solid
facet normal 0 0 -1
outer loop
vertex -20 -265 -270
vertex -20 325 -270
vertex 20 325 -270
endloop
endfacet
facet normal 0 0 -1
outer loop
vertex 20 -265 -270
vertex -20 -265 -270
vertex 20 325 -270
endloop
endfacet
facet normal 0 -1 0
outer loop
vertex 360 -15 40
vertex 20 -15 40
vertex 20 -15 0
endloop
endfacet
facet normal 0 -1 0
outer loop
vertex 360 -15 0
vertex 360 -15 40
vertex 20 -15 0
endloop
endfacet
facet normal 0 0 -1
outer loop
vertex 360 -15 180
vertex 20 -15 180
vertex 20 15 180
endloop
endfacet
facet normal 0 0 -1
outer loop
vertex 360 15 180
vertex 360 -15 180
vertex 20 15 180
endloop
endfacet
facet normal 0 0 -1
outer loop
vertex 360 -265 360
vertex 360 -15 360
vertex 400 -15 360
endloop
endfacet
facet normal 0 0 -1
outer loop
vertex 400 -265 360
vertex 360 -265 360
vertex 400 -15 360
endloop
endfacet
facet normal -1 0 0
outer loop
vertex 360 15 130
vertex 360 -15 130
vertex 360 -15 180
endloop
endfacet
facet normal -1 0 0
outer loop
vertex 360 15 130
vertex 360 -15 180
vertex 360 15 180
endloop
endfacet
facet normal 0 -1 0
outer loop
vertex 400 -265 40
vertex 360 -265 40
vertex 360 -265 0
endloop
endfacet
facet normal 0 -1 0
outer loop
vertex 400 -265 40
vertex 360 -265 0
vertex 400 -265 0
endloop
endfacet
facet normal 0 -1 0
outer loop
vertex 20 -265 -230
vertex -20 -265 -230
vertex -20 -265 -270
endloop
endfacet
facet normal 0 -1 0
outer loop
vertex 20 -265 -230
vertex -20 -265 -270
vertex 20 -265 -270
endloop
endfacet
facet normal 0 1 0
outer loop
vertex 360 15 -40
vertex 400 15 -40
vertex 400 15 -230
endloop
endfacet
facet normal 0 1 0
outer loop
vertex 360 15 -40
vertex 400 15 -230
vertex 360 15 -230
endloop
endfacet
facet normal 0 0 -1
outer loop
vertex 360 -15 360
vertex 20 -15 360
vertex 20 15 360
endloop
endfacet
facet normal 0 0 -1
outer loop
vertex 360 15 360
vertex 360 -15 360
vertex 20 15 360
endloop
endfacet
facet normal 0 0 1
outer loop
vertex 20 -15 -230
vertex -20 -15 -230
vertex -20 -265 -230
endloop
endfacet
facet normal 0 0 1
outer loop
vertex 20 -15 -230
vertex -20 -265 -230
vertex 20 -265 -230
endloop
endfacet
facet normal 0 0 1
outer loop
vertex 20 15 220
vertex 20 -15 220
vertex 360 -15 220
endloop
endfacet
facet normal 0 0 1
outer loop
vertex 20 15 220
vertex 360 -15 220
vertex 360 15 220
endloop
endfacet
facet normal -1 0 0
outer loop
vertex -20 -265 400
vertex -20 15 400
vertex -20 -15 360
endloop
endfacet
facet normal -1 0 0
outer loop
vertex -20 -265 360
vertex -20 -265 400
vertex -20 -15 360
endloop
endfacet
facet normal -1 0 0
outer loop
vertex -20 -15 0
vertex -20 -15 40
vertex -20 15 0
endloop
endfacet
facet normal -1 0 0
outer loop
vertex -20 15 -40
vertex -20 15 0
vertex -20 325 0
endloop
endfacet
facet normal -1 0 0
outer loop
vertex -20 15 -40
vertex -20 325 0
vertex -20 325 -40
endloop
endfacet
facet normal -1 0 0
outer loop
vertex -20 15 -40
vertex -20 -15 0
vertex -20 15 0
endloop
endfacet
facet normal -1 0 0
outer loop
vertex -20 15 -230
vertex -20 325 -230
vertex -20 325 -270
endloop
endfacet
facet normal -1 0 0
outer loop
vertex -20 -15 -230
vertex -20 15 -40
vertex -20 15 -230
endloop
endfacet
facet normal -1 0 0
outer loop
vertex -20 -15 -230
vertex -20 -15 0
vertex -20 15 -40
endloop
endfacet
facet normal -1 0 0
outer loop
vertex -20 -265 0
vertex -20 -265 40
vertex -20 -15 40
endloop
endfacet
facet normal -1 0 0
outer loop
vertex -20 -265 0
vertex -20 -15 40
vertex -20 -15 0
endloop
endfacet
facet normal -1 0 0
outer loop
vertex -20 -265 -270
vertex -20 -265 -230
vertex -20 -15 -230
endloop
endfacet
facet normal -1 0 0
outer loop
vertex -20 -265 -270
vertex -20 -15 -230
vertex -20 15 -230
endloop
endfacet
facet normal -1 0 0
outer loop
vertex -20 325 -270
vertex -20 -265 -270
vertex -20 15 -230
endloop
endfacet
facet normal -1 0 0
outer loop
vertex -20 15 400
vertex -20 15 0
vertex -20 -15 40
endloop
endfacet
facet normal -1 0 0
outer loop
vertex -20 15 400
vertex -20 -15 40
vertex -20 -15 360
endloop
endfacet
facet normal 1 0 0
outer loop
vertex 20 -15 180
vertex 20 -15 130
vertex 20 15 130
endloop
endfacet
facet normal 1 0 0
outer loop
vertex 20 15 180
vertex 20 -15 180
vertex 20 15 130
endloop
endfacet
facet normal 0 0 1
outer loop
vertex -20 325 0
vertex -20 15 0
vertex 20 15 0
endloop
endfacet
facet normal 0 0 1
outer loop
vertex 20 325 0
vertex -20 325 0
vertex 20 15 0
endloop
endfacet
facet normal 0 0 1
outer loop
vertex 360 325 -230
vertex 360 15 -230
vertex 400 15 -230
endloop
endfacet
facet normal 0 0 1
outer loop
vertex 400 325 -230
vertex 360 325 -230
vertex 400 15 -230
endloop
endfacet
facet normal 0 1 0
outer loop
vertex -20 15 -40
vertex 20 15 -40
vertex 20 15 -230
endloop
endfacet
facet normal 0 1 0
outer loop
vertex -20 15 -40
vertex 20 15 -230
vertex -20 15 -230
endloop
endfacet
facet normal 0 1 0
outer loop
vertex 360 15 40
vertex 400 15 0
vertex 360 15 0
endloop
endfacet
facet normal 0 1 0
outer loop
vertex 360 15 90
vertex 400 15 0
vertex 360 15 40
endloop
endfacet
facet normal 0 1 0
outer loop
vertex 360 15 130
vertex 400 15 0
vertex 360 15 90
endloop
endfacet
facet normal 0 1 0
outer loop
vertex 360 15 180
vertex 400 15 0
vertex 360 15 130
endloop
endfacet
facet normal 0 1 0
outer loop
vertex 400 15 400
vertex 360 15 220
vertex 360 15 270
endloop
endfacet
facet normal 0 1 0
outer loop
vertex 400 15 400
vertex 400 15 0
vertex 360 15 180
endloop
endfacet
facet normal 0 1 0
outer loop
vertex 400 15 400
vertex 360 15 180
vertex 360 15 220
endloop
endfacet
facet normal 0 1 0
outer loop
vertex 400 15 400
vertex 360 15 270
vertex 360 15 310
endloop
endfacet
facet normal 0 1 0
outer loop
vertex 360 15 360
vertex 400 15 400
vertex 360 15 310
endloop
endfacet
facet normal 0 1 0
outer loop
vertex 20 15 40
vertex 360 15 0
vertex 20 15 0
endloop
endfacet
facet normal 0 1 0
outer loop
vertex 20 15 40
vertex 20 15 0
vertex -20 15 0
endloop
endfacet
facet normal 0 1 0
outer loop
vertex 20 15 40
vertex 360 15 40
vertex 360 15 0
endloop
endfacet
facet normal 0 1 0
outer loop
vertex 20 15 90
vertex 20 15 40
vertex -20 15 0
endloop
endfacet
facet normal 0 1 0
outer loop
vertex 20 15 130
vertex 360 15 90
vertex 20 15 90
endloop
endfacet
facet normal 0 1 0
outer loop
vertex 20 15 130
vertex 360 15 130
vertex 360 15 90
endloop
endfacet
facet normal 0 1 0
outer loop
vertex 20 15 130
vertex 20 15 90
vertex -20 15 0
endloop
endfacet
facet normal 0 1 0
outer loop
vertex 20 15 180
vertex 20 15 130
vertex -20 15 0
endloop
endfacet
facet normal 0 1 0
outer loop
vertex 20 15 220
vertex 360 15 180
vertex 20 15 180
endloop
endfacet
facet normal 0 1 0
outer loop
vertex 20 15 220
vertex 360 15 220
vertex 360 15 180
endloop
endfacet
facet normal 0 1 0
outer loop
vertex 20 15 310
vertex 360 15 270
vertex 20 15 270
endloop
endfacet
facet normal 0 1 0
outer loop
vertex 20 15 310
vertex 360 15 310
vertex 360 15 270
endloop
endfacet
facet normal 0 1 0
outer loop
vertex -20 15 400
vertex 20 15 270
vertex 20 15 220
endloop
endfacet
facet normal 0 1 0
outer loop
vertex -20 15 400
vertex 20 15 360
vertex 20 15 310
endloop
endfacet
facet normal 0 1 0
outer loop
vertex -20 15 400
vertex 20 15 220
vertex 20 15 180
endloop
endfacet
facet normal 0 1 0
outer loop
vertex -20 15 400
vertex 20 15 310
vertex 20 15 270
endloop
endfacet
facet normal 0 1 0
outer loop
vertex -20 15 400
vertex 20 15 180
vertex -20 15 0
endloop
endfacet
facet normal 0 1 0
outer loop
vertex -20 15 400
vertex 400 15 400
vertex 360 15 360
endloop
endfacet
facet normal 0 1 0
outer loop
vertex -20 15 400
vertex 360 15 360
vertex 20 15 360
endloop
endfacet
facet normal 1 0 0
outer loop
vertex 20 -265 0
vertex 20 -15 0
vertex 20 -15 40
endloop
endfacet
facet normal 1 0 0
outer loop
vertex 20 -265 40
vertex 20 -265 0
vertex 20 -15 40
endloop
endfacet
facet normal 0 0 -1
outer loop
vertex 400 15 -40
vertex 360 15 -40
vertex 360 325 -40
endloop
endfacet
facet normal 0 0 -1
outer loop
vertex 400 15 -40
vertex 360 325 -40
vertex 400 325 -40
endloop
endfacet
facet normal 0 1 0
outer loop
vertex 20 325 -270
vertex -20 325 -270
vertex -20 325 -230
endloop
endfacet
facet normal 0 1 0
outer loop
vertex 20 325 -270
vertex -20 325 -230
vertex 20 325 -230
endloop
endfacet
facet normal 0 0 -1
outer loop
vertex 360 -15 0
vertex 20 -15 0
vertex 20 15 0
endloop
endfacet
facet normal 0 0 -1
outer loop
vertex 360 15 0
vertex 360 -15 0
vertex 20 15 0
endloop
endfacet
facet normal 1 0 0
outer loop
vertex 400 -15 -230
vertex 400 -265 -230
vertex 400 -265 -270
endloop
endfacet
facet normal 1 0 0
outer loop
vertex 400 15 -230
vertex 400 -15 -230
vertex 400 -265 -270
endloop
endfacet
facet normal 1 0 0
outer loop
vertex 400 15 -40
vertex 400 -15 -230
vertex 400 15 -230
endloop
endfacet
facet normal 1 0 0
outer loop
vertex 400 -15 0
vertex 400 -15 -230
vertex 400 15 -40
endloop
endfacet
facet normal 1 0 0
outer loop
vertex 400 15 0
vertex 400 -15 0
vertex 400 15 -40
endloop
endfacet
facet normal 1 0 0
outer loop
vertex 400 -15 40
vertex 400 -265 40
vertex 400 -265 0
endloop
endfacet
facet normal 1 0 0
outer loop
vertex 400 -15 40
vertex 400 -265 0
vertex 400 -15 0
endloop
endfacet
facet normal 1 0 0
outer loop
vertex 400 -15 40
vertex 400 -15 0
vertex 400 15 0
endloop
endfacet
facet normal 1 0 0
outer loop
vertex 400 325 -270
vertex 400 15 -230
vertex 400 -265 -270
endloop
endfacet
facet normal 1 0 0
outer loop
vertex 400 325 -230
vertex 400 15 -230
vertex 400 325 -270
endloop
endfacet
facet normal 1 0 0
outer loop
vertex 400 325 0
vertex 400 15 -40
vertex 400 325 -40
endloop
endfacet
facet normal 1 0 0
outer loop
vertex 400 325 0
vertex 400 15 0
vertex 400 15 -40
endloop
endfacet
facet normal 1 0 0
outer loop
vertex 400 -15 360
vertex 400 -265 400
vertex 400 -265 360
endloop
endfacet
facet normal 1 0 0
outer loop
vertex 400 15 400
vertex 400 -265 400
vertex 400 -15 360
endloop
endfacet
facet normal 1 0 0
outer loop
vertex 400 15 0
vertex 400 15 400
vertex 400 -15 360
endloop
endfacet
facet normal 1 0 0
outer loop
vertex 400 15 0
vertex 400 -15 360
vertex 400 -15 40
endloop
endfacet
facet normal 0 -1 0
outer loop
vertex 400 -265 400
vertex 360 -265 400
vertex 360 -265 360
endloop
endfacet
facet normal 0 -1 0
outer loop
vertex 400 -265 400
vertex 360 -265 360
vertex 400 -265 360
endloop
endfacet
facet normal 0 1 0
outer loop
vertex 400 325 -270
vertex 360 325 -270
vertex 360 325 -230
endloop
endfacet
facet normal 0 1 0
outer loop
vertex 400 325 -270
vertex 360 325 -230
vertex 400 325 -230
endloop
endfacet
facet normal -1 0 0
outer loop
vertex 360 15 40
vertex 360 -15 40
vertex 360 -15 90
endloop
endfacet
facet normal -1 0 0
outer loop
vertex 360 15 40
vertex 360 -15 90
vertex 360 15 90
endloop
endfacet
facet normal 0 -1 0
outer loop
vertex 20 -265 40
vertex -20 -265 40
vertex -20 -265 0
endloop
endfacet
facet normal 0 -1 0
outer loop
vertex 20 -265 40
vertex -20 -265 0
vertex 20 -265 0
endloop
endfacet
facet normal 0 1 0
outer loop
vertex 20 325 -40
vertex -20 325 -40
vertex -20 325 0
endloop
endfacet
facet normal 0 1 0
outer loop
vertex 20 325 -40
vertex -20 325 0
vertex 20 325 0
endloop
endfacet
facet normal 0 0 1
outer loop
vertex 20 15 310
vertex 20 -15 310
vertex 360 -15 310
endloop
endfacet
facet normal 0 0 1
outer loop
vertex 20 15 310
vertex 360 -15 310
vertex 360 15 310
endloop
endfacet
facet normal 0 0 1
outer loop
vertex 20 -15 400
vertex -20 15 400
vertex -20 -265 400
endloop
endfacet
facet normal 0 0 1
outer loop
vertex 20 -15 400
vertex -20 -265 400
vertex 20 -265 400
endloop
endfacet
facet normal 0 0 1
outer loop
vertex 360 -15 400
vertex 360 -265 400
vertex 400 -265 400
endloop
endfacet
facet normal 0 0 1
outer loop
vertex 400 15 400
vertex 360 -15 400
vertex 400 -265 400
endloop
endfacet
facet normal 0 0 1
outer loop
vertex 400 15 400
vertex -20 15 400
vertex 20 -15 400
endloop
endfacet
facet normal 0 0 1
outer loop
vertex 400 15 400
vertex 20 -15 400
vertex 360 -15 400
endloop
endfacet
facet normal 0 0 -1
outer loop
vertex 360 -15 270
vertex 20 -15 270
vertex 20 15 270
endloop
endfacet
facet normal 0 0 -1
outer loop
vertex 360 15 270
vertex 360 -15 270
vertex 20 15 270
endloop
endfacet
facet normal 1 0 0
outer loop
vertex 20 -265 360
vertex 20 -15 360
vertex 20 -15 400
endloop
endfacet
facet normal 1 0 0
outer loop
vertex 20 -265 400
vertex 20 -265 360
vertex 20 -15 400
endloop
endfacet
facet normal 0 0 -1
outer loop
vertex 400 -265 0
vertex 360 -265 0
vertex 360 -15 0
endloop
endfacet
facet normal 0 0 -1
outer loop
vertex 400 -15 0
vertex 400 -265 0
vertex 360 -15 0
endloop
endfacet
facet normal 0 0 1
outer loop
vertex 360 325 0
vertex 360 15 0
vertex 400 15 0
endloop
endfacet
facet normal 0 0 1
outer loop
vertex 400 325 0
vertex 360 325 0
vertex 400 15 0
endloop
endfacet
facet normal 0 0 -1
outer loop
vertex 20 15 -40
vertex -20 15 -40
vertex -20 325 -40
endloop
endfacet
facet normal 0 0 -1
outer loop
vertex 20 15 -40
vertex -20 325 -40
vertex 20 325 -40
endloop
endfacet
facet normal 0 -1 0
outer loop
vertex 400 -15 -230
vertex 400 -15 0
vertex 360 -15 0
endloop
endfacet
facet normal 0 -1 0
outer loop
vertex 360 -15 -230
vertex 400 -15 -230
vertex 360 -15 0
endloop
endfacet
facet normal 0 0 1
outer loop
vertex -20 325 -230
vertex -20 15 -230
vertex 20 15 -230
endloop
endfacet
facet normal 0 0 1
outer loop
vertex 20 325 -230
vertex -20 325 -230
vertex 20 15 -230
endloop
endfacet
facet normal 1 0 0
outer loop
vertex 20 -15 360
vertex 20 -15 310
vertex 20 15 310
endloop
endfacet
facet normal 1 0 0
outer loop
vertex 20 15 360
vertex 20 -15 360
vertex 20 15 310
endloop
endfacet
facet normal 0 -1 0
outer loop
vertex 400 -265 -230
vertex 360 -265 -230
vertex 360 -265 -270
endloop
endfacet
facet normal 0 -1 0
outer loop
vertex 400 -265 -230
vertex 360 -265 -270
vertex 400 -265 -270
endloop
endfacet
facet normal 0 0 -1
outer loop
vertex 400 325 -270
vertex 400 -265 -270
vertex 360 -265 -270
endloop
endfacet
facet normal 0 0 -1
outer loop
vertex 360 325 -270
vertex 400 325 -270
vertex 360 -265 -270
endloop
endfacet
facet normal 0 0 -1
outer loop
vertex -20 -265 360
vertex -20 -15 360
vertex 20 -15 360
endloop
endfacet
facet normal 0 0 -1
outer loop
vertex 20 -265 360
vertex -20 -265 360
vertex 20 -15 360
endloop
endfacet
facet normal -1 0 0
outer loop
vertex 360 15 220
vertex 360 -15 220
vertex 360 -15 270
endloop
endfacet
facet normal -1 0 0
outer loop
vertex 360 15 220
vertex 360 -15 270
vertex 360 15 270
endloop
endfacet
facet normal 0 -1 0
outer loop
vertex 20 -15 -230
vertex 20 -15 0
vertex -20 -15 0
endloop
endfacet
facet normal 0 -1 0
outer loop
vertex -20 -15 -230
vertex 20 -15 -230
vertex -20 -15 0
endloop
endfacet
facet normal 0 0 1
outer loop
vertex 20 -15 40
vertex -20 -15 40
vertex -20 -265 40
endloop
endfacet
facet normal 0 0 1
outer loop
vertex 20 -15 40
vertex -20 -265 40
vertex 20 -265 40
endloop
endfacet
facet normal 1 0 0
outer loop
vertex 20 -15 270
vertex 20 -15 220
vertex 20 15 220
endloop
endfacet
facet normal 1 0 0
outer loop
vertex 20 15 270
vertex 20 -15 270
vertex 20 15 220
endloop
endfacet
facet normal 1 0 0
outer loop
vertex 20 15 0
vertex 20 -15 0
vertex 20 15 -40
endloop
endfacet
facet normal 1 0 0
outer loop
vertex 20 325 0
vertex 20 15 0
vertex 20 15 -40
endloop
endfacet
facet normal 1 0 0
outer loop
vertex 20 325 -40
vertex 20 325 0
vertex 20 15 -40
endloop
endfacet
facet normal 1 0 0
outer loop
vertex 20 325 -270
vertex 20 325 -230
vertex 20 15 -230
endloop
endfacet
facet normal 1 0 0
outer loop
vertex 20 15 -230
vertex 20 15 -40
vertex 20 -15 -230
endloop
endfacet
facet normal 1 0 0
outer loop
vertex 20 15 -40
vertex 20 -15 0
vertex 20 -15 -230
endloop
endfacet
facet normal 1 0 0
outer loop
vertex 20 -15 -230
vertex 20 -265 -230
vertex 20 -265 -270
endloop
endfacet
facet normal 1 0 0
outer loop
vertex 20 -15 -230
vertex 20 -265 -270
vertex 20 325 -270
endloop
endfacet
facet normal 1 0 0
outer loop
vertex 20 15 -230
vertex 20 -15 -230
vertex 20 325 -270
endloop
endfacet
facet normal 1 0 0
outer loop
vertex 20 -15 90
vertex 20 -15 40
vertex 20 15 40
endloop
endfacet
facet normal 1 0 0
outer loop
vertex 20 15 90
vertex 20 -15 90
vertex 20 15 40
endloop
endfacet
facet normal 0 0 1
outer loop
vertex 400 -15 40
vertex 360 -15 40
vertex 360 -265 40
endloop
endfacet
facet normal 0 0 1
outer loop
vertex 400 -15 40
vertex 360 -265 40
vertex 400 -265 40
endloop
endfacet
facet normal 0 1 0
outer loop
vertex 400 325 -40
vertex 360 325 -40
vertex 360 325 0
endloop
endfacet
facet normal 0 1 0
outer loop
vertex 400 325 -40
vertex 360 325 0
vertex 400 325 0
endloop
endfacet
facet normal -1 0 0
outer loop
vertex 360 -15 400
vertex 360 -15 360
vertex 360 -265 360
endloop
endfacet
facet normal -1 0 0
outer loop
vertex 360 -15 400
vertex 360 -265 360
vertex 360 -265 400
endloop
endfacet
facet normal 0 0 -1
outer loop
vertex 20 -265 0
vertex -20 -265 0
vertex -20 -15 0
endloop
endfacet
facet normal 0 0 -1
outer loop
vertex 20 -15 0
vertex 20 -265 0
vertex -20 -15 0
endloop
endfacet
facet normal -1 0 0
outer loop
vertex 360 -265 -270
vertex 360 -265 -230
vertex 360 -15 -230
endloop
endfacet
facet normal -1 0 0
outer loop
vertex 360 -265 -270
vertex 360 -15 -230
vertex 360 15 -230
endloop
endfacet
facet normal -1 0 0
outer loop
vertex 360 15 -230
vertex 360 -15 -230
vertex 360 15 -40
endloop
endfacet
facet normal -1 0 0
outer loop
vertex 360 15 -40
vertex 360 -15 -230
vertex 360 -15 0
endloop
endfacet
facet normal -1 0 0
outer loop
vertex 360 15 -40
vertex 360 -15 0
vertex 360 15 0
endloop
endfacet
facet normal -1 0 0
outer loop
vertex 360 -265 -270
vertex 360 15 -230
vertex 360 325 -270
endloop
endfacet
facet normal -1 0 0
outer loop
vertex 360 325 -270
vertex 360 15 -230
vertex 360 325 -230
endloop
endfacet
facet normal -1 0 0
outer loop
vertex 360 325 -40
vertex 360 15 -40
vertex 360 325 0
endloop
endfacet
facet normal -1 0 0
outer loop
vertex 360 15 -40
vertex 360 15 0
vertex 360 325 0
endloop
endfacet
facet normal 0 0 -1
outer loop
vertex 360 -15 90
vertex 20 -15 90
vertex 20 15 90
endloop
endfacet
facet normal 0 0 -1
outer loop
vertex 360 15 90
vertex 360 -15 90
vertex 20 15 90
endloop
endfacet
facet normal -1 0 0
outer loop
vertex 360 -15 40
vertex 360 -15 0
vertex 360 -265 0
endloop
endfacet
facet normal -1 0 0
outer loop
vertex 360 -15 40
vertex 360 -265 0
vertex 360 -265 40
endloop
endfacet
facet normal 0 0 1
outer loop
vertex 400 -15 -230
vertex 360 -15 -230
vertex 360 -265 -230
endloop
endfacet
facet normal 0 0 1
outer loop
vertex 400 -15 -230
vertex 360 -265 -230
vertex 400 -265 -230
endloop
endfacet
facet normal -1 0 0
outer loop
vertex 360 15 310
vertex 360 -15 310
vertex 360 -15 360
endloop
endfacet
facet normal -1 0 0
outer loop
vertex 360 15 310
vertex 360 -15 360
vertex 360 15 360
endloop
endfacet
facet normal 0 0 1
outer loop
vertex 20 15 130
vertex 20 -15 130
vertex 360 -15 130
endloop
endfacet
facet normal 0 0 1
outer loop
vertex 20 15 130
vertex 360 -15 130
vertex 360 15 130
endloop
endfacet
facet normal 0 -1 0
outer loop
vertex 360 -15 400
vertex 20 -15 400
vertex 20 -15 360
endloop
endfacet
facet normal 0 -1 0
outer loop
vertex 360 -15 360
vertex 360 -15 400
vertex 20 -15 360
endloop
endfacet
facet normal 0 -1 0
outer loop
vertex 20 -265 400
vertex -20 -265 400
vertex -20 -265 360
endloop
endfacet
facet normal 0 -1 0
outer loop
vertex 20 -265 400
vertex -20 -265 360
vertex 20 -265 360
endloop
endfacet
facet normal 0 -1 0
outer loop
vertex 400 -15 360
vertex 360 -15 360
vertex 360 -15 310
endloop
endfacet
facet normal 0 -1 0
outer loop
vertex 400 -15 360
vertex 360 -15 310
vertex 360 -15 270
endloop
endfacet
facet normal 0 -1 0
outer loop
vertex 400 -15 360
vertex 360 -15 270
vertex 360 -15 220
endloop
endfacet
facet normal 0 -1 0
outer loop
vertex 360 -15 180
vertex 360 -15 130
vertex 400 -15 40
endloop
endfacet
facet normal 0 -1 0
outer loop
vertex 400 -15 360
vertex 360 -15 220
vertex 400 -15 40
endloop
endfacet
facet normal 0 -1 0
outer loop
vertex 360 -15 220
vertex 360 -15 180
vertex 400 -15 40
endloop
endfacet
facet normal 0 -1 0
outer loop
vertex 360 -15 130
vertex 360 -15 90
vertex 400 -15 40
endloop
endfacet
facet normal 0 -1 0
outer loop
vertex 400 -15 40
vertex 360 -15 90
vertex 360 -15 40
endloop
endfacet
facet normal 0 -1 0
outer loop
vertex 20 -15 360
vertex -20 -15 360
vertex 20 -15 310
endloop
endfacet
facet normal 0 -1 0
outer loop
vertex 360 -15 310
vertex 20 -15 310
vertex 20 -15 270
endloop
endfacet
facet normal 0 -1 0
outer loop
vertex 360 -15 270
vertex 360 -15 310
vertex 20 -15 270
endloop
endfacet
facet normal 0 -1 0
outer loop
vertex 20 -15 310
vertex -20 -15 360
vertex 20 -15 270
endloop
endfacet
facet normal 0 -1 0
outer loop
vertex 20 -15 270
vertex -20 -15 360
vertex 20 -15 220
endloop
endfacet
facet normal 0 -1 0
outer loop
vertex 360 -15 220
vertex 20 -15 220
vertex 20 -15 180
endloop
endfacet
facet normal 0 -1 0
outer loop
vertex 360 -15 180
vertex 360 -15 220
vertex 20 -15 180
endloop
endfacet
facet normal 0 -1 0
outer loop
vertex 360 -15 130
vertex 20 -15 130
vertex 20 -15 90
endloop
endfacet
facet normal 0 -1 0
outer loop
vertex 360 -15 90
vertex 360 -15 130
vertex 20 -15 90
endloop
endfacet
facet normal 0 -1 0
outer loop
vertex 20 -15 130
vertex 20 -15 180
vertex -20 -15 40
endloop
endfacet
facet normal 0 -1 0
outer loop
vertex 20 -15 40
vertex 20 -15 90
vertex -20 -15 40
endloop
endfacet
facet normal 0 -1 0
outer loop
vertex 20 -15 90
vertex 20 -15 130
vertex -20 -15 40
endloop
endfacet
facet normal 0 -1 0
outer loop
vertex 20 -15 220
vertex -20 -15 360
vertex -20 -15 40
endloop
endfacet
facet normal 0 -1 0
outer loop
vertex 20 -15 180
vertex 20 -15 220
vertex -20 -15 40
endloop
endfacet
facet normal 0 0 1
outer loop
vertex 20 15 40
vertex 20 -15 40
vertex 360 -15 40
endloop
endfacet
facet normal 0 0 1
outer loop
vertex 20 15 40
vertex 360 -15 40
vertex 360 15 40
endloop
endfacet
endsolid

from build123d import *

# Parameters (mm, degrees)
SKETCH1_W             = 40
SKETCH1_H             = 30
BOSS_EXTRUDE1_DEPTH   = 400
BOSS_EXTRUDE1_2_DEPTH = 400
BOSS_EXTRUDE2_REACH   = 553.928
SKETCH2_W             = 40
SKETCH2_H             = 30
SKETCH3_W             = 40
SKETCH3_H             = 40
BOSS_EXTRUDE3_DEPTH   = 250
SKETCH4_W             = 40
SKETCH4_H             = 30
BOSS_EXTRUDE4_DEPTH   = 270
SKETCH5_W             = 40
SKETCH5_H             = 40
BOSS_EXTRUDE5_DEPTH   = 250
SKETCH6_W             = 40
SKETCH6_H             = 40
BOSS_EXTRUDE6_DEPTH   = 310


with BuildPart() as part:
    # Sketch1 → Boss-Extrude1 (new body)
    with BuildSketch(Plane.XY):
        Rectangle(SKETCH1_W, SKETCH1_H)
    extrude(amount=BOSS_EXTRUDE1_DEPTH)


with BuildPart() as body_2:
    # Sketch1 → Boss-Extrude1 2 (new body)
    with BuildSketch(Plane.XY):
        with Locations((380, 0)):
            Rectangle(SKETCH1_W, SKETCH1_H)
    extrude(amount=BOSS_EXTRUDE1_2_DEPTH)

    # Sketch2 → Boss-Extrude2 (add, up to next)
    with BuildSketch(Plane(origin=(20, 0, 0), x_dir=(0, 0, -1), z_dir=(1, 0, 0)), mode=Mode.PRIVATE) as boss_extrude2_sk1:
        with Locations((-380, 0)):
            Rectangle(SKETCH2_W, SKETCH2_H)
    boss_extrude2_tool1 = extrude(boss_extrude2_sk1.sketch, amount=BOSS_EXTRUDE2_REACH, mode=Mode.PRIVATE) - body_2.part
    # Sketch2 → Boss-Extrude2 (add, up to next)
    with BuildSketch(Plane(origin=(20, 0, 0), x_dir=(0, 0, -1), z_dir=(1, 0, 0)), mode=Mode.PRIVATE) as boss_extrude2_sk2:
        with Locations((-290, 0)):
            Rectangle(SKETCH2_W, SKETCH2_H)
    boss_extrude2_tool2 = extrude(boss_extrude2_sk2.sketch, amount=BOSS_EXTRUDE2_REACH, mode=Mode.PRIVATE) - body_2.part
    # Sketch2 → Boss-Extrude2 (add, up to next)
    with BuildSketch(Plane(origin=(20, 0, 0), x_dir=(0, 0, -1), z_dir=(1, 0, 0)), mode=Mode.PRIVATE) as boss_extrude2_sk3:
        with Locations((-110, 0)):
            Rectangle(SKETCH2_W, SKETCH2_H)
    boss_extrude2_tool3 = extrude(boss_extrude2_sk3.sketch, amount=BOSS_EXTRUDE2_REACH, mode=Mode.PRIVATE) - body_2.part
    # Sketch2 → Boss-Extrude2 (add, up to next)
    with BuildSketch(Plane(origin=(20, 0, 0), x_dir=(0, 0, -1), z_dir=(1, 0, 0)), mode=Mode.PRIVATE) as boss_extrude2_sk4:
        with Locations((-20, 0)):
            Rectangle(SKETCH2_W, SKETCH2_H)
    boss_extrude2_tool4 = extrude(boss_extrude2_sk4.sketch, amount=BOSS_EXTRUDE2_REACH, mode=Mode.PRIVATE) - body_2.part
    # Sketch2 → Boss-Extrude2 (add, up to next)
    with BuildSketch(Plane(origin=(20, 0, 0), x_dir=(0, 0, -1), z_dir=(1, 0, 0)), mode=Mode.PRIVATE) as boss_extrude2_sk5:
        with Locations((-200, 0)):
            Rectangle(SKETCH2_W, SKETCH2_H)
    boss_extrude2_tool5 = extrude(boss_extrude2_sk5.sketch, amount=BOSS_EXTRUDE2_REACH, mode=Mode.PRIVATE) - body_2.part

    add(part.part)  # Boss-Extrude2 merges part
    add(boss_extrude2_tool1.solids().sort_by_distance((20, 0, 380))[0])
    add(boss_extrude2_tool2.solids().sort_by_distance((20, 0, 290))[0])
    add(boss_extrude2_tool3.solids().sort_by_distance((20, 0, 110))[0])
    add(boss_extrude2_tool4.solids().sort_by_distance((20, 0, 20))[0])
    add(boss_extrude2_tool5.solids().sort_by_distance((20, 0, 200))[0])

    # Sketch3 → Boss-Extrude3 (add)
    with BuildSketch(Plane.XZ.offset(15)):
        with Locations((0, 380)):
            Rectangle(SKETCH3_W, SKETCH3_H)
        with Locations((0, 20)):
            Rectangle(SKETCH3_W, SKETCH3_H)
        with Locations((380, 380)):
            Rectangle(SKETCH3_W, SKETCH3_H)
        with Locations((380, 20)):
            Rectangle(SKETCH3_W, SKETCH3_H)
    extrude(amount=BOSS_EXTRUDE3_DEPTH)

    # Sketch4 → Boss-Extrude4 (add)
    with BuildSketch(Plane(origin=(0, 0, 0), x_dir=(-1, 0, 0), z_dir=(0, 0, -1))):
        with Locations((-380, 0)):
            Rectangle(SKETCH4_W, SKETCH4_H)
        Rectangle(SKETCH4_W, SKETCH4_H)
    extrude(amount=BOSS_EXTRUDE4_DEPTH)

    # Sketch5 → Boss-Extrude5 (add)
    with BuildSketch(Plane.XZ.offset(15)):
        with Locations((0, -250)):
            Rectangle(SKETCH5_W, SKETCH5_H)
        with Locations((380, -250)):
            Rectangle(SKETCH5_W, SKETCH5_H)
    extrude(amount=BOSS_EXTRUDE5_DEPTH)

    # Sketch6 → Boss-Extrude6 (add)
    with BuildSketch(Plane(origin=(0, 15, 0), x_dir=(1, 0, 0), z_dir=(0, 1, 0))):
        with Locations((0, 250)):
            Rectangle(SKETCH6_W, SKETCH6_H)
        with Locations((380, 250)):
            Rectangle(SKETCH6_W, SKETCH6_H)
        with Locations((0, 20)):
            Rectangle(SKETCH6_W, SKETCH6_H)
        with Locations((380, 20)):
            Rectangle(SKETCH6_W, SKETCH6_H)
    extrude(amount=BOSS_EXTRUDE6_DEPTH)


solid = body_2.part
